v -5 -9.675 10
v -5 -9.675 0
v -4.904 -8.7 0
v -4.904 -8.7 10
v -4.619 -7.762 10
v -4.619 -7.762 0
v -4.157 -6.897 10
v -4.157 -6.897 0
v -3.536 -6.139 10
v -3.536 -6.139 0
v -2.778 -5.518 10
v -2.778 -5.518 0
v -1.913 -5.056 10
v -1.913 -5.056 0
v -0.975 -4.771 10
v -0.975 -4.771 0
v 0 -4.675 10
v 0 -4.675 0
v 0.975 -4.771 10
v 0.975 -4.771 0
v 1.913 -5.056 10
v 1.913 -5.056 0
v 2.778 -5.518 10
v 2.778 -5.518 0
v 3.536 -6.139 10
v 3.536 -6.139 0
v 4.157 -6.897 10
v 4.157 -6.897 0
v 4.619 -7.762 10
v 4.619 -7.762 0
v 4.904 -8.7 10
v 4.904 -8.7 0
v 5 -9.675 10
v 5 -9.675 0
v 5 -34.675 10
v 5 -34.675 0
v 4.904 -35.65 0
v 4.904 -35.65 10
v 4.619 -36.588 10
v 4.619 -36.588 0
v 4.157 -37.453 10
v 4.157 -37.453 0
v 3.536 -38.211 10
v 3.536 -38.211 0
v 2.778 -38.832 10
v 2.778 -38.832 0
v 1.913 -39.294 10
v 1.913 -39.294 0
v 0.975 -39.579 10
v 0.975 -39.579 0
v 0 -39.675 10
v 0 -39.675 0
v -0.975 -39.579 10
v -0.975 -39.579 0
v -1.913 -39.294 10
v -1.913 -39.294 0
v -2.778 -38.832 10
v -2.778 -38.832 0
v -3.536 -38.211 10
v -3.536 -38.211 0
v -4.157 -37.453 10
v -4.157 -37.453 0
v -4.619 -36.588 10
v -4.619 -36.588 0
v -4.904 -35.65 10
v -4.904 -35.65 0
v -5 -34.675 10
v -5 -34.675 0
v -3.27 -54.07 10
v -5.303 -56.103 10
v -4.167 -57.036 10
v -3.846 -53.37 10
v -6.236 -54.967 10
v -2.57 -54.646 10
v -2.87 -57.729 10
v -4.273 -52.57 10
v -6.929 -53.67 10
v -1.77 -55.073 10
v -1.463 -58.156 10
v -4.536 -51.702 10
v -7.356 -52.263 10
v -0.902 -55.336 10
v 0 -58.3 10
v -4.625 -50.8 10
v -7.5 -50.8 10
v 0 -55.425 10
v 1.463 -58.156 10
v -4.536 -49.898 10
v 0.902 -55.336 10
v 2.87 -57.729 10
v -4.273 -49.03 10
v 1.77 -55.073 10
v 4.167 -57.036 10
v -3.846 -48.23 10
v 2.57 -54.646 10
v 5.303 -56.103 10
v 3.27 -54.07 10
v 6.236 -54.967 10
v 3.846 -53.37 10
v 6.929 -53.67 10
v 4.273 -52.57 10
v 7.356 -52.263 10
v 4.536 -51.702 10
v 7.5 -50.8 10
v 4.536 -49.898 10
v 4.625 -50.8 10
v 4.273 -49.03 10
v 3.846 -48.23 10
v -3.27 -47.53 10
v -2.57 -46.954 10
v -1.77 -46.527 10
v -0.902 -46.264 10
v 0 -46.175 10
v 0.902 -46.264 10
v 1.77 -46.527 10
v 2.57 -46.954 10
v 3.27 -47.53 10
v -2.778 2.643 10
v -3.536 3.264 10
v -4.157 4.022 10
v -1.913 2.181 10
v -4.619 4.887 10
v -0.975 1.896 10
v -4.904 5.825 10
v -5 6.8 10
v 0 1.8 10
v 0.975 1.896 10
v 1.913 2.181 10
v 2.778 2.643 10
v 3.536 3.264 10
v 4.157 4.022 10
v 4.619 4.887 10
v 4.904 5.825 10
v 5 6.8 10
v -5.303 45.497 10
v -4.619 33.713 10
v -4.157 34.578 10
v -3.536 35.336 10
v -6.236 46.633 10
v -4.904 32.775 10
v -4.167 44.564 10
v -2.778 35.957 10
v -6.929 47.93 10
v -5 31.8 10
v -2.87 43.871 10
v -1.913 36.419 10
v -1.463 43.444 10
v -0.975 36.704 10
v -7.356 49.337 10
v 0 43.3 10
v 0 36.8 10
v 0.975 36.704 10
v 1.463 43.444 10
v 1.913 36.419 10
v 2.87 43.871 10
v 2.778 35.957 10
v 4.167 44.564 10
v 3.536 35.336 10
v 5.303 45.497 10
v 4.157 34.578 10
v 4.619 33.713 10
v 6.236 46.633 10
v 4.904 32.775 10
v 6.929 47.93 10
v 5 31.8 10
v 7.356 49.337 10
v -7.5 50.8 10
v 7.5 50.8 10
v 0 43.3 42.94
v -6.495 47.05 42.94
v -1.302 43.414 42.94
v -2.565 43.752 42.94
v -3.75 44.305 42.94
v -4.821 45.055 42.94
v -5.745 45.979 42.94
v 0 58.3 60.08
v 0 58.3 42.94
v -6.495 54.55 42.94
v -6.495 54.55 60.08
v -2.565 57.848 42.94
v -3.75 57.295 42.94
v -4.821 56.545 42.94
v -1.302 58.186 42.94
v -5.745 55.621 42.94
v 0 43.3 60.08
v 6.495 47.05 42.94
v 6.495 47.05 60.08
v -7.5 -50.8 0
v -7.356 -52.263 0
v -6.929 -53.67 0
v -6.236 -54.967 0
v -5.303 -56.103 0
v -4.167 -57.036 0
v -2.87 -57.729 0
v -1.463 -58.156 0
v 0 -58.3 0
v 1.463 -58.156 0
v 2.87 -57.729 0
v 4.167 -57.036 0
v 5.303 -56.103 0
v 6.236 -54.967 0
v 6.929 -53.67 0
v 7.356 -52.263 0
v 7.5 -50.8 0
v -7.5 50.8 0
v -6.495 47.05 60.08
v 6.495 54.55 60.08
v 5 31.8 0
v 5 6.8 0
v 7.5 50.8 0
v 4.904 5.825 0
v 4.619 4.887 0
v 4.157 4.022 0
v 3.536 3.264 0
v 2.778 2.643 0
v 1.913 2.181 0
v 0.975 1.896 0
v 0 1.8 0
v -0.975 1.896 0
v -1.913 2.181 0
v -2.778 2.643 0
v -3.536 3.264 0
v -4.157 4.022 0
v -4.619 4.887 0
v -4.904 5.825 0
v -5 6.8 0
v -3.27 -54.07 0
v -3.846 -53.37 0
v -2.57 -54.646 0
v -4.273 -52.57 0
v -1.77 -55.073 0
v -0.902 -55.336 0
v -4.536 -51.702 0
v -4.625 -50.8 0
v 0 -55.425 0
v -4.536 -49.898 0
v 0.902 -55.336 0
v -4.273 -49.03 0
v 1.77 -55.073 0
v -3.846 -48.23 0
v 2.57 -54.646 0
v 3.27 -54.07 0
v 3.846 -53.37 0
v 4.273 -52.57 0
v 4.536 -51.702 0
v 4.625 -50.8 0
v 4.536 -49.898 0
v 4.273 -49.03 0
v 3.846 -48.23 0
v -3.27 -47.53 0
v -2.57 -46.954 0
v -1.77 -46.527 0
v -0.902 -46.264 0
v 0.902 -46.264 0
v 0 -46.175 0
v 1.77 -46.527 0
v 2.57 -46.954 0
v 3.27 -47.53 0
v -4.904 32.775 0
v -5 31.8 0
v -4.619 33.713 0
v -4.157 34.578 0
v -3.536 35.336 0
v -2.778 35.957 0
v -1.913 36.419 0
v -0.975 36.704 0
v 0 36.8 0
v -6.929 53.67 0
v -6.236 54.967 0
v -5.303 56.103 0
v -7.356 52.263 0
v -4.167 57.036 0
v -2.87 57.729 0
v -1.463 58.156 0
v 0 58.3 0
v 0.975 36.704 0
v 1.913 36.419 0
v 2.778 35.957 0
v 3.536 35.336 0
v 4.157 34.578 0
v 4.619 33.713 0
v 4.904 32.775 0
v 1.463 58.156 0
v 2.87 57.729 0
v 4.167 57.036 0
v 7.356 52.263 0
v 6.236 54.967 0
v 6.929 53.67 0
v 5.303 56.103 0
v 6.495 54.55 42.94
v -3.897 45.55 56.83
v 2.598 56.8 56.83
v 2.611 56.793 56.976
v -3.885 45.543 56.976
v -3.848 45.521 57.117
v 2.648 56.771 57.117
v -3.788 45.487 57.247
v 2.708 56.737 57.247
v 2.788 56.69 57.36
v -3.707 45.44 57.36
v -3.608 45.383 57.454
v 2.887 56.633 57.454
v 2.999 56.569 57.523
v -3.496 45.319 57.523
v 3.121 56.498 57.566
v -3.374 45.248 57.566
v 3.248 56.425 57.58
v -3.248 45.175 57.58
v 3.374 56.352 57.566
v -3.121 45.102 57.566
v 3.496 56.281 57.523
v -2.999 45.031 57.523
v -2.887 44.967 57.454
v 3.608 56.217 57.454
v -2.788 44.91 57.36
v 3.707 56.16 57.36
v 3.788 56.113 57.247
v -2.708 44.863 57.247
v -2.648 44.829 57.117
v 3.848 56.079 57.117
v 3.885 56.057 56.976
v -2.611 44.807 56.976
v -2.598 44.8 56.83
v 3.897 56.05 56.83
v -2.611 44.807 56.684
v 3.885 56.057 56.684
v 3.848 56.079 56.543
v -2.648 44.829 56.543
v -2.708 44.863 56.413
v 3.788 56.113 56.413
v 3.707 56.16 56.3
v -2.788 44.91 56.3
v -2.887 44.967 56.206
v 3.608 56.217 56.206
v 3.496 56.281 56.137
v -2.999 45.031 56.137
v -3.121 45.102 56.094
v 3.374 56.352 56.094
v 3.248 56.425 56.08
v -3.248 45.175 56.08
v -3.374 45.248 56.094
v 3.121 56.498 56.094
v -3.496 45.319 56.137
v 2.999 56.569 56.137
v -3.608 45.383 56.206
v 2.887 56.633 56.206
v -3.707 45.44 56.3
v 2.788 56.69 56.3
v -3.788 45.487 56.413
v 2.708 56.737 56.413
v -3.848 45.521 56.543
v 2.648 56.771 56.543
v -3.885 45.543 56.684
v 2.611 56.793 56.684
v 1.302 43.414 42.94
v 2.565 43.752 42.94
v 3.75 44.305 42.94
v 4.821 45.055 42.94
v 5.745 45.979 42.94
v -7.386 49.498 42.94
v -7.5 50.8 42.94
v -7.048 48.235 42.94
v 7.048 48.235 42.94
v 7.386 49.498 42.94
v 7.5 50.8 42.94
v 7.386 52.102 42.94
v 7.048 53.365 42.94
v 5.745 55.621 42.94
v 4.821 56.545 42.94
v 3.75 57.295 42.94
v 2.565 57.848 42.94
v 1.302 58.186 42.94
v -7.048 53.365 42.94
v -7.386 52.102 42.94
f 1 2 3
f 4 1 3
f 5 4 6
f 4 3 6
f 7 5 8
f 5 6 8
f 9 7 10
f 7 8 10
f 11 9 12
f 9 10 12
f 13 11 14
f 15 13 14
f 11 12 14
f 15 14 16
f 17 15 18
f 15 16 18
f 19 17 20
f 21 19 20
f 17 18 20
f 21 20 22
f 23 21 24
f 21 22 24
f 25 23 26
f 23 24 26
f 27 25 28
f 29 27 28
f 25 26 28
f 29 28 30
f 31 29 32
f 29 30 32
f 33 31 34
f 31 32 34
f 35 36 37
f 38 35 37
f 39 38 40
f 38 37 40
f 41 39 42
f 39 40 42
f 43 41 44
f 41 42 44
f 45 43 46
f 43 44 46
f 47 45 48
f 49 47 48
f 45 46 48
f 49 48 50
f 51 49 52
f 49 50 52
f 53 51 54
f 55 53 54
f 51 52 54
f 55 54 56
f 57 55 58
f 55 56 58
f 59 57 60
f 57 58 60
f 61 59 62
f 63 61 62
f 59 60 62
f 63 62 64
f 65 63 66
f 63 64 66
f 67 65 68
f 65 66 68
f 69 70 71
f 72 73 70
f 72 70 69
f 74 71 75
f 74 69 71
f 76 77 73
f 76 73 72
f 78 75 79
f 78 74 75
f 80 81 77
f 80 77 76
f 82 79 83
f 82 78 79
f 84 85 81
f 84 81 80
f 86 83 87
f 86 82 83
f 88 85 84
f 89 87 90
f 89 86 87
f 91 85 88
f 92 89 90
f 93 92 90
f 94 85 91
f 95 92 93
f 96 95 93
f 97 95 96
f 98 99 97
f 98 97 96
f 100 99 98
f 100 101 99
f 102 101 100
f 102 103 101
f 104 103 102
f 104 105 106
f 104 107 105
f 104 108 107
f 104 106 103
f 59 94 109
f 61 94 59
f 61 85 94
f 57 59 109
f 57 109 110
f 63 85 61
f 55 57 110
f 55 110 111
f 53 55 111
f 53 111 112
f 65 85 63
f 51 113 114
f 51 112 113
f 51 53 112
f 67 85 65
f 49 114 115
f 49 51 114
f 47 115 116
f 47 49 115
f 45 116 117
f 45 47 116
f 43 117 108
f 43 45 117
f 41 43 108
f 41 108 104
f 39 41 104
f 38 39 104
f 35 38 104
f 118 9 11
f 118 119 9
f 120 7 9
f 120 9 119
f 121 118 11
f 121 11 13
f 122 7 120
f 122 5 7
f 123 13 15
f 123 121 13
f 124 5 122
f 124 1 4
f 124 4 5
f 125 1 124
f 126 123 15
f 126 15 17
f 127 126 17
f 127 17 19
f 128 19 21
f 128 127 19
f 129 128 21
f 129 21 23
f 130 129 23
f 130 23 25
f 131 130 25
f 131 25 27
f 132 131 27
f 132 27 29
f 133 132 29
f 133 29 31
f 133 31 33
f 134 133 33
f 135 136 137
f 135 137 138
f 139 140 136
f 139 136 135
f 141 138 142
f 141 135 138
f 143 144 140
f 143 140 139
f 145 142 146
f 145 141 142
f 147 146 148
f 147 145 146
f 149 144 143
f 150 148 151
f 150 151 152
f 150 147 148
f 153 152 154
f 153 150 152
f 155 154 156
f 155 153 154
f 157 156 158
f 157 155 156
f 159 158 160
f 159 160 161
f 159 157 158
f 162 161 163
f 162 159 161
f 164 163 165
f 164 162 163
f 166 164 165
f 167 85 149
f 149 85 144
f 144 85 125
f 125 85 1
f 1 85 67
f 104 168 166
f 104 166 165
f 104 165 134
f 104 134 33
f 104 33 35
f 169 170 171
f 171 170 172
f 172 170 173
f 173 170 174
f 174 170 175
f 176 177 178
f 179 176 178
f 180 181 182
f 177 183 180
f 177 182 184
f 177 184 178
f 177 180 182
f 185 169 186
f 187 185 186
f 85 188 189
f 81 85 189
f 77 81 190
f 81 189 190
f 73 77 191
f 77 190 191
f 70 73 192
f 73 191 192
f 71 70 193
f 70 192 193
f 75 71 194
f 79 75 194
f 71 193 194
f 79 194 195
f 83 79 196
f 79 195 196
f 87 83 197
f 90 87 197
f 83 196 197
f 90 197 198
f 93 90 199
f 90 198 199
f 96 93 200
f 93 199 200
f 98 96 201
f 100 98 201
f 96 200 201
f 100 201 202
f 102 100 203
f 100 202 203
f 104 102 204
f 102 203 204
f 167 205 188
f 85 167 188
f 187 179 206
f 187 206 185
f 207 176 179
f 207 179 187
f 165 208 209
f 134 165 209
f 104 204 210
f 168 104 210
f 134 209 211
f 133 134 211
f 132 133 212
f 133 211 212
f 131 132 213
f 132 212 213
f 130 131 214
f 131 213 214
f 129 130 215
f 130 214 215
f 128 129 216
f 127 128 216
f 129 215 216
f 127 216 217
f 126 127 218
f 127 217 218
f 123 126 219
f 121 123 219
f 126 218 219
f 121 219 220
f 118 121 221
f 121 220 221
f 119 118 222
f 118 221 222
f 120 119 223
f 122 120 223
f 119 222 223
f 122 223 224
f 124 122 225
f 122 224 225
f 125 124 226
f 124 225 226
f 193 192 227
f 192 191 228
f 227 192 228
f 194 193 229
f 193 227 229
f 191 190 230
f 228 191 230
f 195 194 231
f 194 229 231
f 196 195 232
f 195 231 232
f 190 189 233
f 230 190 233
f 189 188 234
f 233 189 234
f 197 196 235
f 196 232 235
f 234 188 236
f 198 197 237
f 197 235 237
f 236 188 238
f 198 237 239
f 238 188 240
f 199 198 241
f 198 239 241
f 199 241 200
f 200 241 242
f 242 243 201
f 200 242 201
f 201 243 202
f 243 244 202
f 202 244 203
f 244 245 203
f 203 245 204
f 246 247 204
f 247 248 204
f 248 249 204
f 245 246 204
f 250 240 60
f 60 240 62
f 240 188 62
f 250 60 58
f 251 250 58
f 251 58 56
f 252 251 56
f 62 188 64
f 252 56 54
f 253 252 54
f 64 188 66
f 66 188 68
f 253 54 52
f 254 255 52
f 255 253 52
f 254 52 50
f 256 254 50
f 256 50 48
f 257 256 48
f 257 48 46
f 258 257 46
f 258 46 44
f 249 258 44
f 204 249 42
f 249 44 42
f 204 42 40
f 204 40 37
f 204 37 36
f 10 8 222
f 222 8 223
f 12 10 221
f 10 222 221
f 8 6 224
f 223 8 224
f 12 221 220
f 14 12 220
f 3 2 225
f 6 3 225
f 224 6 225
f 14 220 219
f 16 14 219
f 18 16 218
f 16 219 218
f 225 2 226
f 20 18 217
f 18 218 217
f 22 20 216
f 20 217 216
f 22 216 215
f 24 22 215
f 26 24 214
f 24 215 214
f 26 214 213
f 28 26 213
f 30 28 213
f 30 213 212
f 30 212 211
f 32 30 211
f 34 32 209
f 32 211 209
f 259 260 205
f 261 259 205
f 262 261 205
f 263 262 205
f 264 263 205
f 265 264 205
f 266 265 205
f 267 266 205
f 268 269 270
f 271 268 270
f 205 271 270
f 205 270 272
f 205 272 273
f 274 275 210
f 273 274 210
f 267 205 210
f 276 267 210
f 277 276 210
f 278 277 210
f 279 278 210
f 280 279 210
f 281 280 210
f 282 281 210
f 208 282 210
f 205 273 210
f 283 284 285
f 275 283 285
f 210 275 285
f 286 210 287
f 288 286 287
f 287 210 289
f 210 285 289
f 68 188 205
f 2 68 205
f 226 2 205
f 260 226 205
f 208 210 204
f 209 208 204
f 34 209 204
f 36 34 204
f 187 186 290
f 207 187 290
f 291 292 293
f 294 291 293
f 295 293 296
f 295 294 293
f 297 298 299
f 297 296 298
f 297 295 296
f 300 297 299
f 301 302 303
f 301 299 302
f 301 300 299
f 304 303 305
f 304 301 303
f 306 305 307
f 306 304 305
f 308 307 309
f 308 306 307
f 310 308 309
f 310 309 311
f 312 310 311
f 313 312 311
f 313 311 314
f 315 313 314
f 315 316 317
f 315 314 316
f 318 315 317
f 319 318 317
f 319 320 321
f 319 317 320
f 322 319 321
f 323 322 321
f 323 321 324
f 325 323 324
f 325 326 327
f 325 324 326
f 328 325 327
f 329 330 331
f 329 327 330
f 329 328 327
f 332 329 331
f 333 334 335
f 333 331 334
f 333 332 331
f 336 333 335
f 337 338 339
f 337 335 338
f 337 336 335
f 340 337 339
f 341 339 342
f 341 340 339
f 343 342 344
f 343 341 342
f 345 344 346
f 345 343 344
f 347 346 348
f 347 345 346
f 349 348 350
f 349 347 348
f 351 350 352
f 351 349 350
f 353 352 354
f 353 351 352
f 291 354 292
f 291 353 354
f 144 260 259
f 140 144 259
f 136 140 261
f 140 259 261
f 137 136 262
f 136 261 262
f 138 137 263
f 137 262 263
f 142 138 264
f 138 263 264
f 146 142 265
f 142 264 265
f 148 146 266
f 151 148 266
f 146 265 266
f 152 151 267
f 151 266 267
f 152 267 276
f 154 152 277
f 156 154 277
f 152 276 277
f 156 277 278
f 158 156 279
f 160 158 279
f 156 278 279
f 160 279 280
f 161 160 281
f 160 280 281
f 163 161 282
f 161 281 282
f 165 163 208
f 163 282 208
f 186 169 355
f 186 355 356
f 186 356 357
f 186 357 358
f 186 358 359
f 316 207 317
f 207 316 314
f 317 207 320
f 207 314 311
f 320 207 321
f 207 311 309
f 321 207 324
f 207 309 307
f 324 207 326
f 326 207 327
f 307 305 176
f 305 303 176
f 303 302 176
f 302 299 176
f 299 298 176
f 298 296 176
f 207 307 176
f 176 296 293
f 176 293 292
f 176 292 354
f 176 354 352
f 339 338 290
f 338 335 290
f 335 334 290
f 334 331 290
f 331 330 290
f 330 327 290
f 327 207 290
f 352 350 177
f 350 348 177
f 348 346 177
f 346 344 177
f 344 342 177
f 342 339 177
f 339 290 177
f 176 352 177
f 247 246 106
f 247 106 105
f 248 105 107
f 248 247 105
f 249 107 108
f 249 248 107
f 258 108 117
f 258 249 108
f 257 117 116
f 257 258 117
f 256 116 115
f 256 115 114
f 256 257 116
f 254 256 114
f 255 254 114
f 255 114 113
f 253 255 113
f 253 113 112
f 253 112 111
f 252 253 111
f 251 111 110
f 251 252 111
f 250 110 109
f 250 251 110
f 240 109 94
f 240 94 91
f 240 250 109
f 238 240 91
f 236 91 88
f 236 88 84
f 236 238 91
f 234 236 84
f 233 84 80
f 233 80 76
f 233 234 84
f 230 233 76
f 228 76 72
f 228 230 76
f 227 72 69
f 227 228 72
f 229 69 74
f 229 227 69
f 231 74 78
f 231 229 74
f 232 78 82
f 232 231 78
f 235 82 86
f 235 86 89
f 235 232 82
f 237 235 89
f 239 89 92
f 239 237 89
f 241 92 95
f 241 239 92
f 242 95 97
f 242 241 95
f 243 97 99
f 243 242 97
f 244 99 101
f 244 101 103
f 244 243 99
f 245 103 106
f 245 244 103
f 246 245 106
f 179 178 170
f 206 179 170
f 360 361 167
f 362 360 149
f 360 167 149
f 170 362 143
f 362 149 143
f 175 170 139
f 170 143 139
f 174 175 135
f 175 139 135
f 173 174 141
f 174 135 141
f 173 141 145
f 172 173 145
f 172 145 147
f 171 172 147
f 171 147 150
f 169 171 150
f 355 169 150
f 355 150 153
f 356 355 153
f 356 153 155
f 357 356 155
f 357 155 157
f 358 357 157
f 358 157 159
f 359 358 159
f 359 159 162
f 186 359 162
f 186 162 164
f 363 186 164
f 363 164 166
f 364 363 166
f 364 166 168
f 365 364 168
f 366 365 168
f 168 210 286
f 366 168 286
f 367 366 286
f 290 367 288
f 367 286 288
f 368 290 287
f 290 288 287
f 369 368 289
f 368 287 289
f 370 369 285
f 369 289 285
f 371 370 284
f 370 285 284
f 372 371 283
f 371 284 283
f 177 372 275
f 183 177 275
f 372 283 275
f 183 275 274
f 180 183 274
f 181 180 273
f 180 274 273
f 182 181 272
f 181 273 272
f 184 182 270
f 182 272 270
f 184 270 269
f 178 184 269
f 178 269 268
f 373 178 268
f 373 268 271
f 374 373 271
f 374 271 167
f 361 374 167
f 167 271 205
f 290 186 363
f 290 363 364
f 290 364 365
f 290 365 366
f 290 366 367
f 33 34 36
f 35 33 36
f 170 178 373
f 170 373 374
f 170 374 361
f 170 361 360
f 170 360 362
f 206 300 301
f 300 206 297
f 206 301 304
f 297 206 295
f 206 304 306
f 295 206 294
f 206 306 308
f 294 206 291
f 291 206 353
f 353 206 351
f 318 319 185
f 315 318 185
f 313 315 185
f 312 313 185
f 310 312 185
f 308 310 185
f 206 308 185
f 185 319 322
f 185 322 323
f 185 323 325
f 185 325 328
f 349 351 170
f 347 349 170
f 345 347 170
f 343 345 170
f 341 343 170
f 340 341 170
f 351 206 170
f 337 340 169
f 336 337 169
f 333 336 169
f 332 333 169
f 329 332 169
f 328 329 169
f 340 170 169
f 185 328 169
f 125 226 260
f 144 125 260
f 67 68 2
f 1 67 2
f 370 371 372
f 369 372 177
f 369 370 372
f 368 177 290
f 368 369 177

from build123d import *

# Parameters (mm, degrees)
SKETCH1_R               = 4.625
BOSS_EXTRUDE1_DEPTH     = 10
BOSS_EXTRUDE2_DEPTH     = 42.94
BOSS_EXTRUDE3_DEPTH     = 17.14
CUT_EXTRUDE1_DEPTH      = 123.845099649
CUT_EXTRUDE1_DEPTH_BACK = 123.845099649
SKETCH4_R               = 0.75


with BuildPart() as part:
    # Sketch1 → Boss-Extrude1 (new body)
    with BuildSketch(Plane.XY):
        with BuildLine():
            Line((-7.5, 50.8), (-7.5, -50.8))
            ThreePointArc((-7.5, -50.8), (0, -58.3), (7.5, -50.8))
            Line((7.5, -50.8), (7.5, 50.8))
            ThreePointArc((7.5, 50.8), (0, 43.3), (-7.5, 50.8))
        make_face()
        with Locations((0, -50.8)):
            Circle(SKETCH1_R, mode=Mode.SUBTRACT)
        with BuildLine():
            ThreePointArc((5, -34.675), (0, -39.675), (-5, -34.675))
            Line((-5, -34.675), (-5, -9.675))
            ThreePointArc((-5, -9.675), (0, -4.675), (5, -9.675))
            Line((5, -9.675), (5, -34.675))
        make_face(mode=Mode.SUBTRACT)
        with BuildLine():
            ThreePointArc((-5, 31.8), (0, 36.8), (5, 31.8))
            Line((5, 31.8), (5, 6.8))
            ThreePointArc((5, 6.8), (0, 1.8), (-5, 6.8))
            Line((-5, 6.8), (-5, 31.8))
        make_face(mode=Mode.SUBTRACT)
    extrude(amount=BOSS_EXTRUDE1_DEPTH)

    # Sketch1<4> → Boss-Extrude2 (add)
    with BuildSketch(Plane.XY):
        with BuildLine():
            ThreePointArc((7.5, 50.8), (0, 58.3), (-7.5, 50.8))
            ThreePointArc((-7.5, 50.8), (0, 43.3), (7.5, 50.8))
        make_face()
    extrude(amount=BOSS_EXTRUDE2_DEPTH)

    # Sketch3 → Boss-Extrude3 (add)
    with BuildSketch(Plane.XY.offset(42.94)):
        Polygon((0, 43.3), (6.495190528, 47.05), (6.495190528, 54.55), (0, 58.3), (-6.495190528, 54.55), (-6.495190528, 47.05), align=None)
    extrude(amount=BOSS_EXTRUDE3_DEPTH)

    # Sketch4 → Cut-Extrude1 (cut, two sides: drawn at the far end of the back side and taken through both)
    with BuildSketch(Plane(origin=(25.24464052, 43.725, 0), x_dir=(0.8660254037844416, -0.499999999999995, 0), z_dir=(0.49999999999999495, 0.8660254037844415, 0)).offset(-CUT_EXTRUDE1_DEPTH_BACK)):
        with Locations((-25.4, -56.83)):
            Circle(SKETCH4_R)
    extrude(amount=CUT_EXTRUDE1_DEPTH + CUT_EXTRUDE1_DEPTH_BACK, mode=Mode.SUBTRACT)


solid = part.part
